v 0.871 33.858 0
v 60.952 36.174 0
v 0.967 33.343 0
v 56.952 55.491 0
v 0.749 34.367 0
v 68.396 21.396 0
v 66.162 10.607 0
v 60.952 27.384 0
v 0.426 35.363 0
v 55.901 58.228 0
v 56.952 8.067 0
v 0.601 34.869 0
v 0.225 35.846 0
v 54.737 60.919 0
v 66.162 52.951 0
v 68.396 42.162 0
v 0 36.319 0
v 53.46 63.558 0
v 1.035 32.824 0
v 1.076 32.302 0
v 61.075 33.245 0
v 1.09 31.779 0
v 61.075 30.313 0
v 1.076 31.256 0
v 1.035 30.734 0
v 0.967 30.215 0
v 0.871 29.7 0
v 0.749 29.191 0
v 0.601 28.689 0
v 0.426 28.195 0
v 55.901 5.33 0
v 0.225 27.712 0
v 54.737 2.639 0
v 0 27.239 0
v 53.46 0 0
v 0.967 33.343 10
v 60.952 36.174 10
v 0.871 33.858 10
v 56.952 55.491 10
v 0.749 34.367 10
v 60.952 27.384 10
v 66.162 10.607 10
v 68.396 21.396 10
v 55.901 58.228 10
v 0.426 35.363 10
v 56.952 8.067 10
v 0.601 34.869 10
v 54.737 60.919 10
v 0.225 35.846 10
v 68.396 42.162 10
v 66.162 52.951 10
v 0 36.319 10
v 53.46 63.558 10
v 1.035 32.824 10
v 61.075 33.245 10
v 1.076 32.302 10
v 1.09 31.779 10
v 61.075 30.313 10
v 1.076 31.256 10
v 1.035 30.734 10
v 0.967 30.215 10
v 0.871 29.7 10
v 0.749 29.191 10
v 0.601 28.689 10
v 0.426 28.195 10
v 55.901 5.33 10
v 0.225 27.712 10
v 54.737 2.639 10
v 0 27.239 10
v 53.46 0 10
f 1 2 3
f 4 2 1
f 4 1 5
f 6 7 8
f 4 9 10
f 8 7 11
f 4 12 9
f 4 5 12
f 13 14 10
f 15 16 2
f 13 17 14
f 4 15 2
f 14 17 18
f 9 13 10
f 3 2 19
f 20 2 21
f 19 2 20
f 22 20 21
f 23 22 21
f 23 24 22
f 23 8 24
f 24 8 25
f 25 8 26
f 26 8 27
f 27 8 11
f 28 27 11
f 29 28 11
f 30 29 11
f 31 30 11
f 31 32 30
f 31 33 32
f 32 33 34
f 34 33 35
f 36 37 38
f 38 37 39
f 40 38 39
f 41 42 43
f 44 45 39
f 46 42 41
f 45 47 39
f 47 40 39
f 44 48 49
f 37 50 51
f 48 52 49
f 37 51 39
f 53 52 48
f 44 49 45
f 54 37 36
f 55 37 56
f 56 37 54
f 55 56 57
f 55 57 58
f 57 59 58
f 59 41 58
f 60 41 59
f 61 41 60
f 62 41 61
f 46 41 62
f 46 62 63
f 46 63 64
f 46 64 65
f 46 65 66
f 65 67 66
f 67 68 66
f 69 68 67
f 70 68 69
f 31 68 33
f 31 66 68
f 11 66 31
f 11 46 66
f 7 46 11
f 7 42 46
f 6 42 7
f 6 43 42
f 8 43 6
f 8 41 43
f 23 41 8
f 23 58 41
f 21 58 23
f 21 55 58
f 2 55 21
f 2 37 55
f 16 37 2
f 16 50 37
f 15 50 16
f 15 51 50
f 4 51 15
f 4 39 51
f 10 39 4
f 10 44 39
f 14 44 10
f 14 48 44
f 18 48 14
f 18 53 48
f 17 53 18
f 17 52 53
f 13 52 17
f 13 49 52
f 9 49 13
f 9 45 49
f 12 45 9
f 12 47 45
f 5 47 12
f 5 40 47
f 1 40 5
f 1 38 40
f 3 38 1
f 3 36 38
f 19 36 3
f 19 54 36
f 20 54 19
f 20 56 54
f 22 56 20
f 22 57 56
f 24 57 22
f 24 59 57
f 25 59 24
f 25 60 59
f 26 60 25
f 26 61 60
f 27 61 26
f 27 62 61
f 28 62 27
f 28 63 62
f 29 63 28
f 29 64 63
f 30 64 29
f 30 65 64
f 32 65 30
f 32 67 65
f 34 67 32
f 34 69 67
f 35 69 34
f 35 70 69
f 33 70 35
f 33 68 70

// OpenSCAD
$fn = 32;

// ----------------------------------------------------------------------
// Gear sector: 2 teeth on 54 degrees
// ----------------------------------------------------------------------

// --- parameters (mm) ---
sector_angle = 54;        // sector angle, degrees
root_r = 70;              // root circle radius
tooth_h = 8;              // tooth height over the root circle
teeth = 2;                // number of teeth on the sector
hub_r = 10;               // hub bore radius
plate_t = 10;             // sector thickness, Z
arc_step = 3;             // sampling step of the root/hub arcs, degrees
fit_tol = 0.1;            // declared fit tolerance (prompt contract)
free_tol = 0.5;           // declared free tolerance (prompt contract)

tip_r = root_r + tooth_h;  // tip circle radius

profile = [[53.46, 0], [54.737, 2.639], [55.901, 5.33], [56.952, 8.067], [66.162, 10.607], [68.396, 21.396], [60.952, 27.384], [61.075, 30.313], [61.075, 33.245], [60.952, 36.174], [68.396, 42.162], [66.162, 52.951], [56.952, 55.491], [55.901, 58.228], [54.737, 60.919], [53.46, 63.558], [0, 36.319], [0.225, 35.846], [0.426, 35.363], [0.601, 34.869], [0.749, 34.367], [0.871, 33.858], [0.967, 33.343], [1.035, 32.824], [1.076, 32.302], [1.09, 31.779], [1.076, 31.256], [1.035, 30.734], [0.967, 30.215], [0.871, 29.7], [0.749, 29.191], [0.601, 28.689], [0.426, 28.195], [0.225, 27.712], [0, 27.239]];  // primary outline, 35 points, counter clockwise

// --- the one profile operation ---
linear_extrude(height = plate_t) polygon(points = profile);
